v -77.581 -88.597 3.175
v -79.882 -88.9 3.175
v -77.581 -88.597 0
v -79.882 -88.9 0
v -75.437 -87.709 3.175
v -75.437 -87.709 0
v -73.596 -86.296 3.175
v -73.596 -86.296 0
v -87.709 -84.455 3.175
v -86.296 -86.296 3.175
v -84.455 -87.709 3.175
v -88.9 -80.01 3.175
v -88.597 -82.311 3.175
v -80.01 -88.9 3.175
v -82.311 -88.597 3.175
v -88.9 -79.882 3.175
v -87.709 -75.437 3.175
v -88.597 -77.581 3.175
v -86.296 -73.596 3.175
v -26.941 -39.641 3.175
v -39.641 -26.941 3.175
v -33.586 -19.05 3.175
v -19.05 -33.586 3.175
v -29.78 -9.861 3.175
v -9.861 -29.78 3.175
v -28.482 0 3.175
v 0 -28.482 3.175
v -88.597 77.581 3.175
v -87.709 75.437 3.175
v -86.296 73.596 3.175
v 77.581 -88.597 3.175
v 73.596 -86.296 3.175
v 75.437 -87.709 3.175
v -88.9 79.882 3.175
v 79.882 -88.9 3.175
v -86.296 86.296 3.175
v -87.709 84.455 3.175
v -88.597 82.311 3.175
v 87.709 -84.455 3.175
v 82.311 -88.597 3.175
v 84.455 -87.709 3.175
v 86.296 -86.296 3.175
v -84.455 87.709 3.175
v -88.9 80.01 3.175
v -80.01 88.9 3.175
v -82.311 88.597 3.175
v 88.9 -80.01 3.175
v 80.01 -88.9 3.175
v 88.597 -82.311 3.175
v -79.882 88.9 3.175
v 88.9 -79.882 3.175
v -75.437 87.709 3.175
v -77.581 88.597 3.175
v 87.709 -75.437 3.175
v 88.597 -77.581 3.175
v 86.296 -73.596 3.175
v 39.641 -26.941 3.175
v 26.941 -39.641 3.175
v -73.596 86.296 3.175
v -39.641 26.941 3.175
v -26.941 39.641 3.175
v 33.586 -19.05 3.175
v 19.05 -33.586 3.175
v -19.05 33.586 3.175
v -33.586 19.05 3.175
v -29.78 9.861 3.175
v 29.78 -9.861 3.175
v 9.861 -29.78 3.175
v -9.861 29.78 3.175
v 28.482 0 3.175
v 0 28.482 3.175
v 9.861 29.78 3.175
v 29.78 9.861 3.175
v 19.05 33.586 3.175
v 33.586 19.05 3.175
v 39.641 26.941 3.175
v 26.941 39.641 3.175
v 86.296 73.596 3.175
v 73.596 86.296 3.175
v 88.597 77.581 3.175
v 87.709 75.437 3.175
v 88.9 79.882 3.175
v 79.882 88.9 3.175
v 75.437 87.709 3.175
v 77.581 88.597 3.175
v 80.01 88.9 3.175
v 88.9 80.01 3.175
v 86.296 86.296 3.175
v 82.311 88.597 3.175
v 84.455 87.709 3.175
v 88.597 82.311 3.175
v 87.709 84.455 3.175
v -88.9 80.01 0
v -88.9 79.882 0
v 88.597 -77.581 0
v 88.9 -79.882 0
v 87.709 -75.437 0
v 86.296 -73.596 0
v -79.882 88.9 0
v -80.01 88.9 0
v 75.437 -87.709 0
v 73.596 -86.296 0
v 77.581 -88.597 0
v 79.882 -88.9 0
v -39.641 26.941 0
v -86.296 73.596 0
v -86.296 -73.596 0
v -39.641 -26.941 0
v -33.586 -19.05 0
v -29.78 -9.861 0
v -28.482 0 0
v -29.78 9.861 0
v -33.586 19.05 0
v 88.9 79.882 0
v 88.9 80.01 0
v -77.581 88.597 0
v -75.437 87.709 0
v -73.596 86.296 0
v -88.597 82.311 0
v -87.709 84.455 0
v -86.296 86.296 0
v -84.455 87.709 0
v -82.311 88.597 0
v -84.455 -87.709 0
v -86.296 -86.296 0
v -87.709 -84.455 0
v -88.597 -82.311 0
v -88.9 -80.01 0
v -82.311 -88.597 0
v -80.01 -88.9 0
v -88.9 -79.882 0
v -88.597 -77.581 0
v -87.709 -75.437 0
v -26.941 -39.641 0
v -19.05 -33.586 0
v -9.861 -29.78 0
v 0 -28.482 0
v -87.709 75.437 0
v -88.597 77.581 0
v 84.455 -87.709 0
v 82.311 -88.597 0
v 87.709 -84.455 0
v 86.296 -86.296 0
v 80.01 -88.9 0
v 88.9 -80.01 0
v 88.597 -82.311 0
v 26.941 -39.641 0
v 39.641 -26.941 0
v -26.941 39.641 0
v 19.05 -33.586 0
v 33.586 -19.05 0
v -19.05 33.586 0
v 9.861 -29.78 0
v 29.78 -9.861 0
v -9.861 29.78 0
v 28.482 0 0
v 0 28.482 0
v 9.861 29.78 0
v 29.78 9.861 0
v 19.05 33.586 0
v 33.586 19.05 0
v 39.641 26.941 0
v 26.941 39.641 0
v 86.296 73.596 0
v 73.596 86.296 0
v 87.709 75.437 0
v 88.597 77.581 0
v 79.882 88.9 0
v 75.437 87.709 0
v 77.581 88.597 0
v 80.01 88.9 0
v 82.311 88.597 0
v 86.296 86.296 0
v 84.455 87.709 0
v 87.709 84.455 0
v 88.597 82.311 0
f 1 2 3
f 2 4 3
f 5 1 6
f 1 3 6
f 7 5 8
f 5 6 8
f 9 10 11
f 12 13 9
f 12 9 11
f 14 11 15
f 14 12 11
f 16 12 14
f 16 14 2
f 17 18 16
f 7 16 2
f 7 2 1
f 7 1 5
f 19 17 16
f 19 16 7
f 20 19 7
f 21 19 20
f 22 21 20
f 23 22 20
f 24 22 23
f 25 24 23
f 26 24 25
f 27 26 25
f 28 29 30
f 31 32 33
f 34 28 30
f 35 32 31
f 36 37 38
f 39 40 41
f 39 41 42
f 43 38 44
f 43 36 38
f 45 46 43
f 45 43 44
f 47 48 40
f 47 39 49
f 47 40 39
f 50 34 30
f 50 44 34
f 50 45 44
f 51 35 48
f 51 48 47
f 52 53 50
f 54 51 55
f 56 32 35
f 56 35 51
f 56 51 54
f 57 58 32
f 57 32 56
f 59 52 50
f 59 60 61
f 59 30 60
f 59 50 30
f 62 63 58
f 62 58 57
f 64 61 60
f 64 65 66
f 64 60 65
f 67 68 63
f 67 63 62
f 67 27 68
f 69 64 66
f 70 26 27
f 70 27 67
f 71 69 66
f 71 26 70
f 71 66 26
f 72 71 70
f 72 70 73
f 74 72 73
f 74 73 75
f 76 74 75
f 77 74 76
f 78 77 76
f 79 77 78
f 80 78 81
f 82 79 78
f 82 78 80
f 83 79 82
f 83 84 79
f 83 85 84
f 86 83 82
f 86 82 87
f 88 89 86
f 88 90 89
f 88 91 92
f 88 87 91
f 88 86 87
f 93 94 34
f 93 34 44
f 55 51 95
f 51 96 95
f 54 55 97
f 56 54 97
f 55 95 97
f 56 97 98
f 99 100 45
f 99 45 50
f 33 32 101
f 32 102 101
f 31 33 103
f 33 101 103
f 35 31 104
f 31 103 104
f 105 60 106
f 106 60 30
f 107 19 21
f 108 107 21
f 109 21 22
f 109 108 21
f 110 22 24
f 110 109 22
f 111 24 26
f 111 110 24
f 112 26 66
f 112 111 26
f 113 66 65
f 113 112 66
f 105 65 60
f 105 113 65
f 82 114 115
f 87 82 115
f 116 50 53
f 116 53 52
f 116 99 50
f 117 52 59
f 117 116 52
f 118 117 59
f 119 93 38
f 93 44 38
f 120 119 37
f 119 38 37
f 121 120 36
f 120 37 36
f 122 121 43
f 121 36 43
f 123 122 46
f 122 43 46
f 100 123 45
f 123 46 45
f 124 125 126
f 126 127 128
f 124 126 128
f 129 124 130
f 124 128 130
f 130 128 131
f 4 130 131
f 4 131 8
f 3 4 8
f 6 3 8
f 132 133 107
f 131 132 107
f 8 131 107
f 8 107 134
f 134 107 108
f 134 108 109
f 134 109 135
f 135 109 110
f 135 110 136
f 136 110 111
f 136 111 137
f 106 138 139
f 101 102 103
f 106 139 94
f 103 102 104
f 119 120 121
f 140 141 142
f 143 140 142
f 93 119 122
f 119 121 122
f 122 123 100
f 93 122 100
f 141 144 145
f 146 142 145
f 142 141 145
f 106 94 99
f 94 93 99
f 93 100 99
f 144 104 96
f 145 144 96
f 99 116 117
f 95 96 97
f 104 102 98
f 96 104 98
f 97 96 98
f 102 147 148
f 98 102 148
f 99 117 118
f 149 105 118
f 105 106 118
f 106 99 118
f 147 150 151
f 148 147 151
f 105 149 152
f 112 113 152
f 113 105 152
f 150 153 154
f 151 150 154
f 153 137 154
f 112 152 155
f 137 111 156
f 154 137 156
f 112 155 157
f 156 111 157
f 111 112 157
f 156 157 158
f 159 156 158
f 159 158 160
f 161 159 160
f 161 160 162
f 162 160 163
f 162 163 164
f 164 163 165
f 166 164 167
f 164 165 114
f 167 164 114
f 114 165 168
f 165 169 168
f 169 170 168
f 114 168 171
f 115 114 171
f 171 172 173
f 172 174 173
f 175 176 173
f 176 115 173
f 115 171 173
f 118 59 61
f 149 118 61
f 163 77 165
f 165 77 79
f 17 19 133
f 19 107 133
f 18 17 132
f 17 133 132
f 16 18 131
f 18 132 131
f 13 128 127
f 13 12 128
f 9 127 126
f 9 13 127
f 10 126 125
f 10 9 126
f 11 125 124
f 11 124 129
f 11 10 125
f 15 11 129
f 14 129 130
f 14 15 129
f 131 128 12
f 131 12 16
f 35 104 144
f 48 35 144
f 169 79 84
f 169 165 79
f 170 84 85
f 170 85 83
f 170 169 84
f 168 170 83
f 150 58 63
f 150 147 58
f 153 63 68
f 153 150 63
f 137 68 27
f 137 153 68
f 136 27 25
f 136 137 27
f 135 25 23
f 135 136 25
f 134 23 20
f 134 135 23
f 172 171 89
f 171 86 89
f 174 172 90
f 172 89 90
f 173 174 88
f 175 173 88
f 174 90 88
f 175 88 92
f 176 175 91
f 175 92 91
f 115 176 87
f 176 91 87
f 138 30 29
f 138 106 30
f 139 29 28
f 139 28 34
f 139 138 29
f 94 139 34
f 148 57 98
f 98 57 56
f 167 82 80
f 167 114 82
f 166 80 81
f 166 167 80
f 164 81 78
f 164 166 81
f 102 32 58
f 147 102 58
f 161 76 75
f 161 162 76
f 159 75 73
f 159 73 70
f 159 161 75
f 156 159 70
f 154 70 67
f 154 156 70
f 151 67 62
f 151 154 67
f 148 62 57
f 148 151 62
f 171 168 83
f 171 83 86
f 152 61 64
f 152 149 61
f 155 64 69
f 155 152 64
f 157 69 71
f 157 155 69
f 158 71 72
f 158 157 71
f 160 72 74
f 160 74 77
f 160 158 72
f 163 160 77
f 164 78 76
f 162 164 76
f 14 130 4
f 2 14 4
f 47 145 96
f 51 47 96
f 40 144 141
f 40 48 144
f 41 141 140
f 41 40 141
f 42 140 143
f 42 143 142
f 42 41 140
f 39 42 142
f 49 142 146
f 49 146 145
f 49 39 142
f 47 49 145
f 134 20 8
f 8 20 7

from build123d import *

# Parameters (mm, degrees)
F0_W     = 177.8
F0_H     = 177.8
F1_DEPTH = 3.175
F3_DEPTH = 3.176
F4_R     = 38.1
F5_R     = 8.89


# Not quite as in the source:
# - a length typed as a fraction of an inch, garbled in the dataset ("3 / 203.2 mm" for 3/8 in), is restored


with BuildPart() as f1:
    # F0 (on Top) → F1 (new body)
    with BuildSketch(Plane.XY):
        Rectangle(F0_W, F0_H)
    extrude(amount=F1_DEPTH)

    # F2 (on face) → F3 (cut, through all)
    with BuildSketch(Plane.XY.offset(3.175)):
        Polygon((76.2, 88.9), (-76.2, 88.9), (0, 12.7), align=None)
        Polygon((88.9, -76.2), (88.9, 76.2), (12.7, 0), align=None)
        Polygon((-76.2, -88.9), (76.2, -88.9), (0, -12.7), align=None)
        Polygon((-12.7, 0), (-88.9, 76.2), (-88.9, -76.2), align=None)
    extrude(amount=-F3_DEPTH, mode=Mode.SUBTRACT)

    # F4
    f4_edges = [f1.edges().sort_by_distance(p)[0] for p in [
        (0, -12.7, 1.5875),
        (12.7, 0, 1.5875),
        (0, 12.7, 1.5875),
        (-12.7, 0, 1.5875),
    ]]
    fillet(f4_edges, radius=F4_R)

    # F5
    f5_edges = [f1.edges().sort_by_distance(p)[0] for p in [
        (88.9, 88.9, 1.5875),
        (88.9, 76.2, 1.5875),
        (88.9, -76.2, 1.5875),
        (88.9, -88.9, 1.5875),
        (76.2, -88.9, 1.5875),
        (-76.2, -88.9, 1.5875),
        (-88.9, -88.9, 1.5875),
        (-88.9, -76.2, 1.5875),
        (-88.9, 76.2, 1.5875),
        (-88.9, 88.9, 1.5875),
        (-76.2, 88.9, 1.5875),
        (76.2, 88.9, 1.5875),
    ]]
    fillet(f5_edges, radius=F5_R)


solid = f1.part
